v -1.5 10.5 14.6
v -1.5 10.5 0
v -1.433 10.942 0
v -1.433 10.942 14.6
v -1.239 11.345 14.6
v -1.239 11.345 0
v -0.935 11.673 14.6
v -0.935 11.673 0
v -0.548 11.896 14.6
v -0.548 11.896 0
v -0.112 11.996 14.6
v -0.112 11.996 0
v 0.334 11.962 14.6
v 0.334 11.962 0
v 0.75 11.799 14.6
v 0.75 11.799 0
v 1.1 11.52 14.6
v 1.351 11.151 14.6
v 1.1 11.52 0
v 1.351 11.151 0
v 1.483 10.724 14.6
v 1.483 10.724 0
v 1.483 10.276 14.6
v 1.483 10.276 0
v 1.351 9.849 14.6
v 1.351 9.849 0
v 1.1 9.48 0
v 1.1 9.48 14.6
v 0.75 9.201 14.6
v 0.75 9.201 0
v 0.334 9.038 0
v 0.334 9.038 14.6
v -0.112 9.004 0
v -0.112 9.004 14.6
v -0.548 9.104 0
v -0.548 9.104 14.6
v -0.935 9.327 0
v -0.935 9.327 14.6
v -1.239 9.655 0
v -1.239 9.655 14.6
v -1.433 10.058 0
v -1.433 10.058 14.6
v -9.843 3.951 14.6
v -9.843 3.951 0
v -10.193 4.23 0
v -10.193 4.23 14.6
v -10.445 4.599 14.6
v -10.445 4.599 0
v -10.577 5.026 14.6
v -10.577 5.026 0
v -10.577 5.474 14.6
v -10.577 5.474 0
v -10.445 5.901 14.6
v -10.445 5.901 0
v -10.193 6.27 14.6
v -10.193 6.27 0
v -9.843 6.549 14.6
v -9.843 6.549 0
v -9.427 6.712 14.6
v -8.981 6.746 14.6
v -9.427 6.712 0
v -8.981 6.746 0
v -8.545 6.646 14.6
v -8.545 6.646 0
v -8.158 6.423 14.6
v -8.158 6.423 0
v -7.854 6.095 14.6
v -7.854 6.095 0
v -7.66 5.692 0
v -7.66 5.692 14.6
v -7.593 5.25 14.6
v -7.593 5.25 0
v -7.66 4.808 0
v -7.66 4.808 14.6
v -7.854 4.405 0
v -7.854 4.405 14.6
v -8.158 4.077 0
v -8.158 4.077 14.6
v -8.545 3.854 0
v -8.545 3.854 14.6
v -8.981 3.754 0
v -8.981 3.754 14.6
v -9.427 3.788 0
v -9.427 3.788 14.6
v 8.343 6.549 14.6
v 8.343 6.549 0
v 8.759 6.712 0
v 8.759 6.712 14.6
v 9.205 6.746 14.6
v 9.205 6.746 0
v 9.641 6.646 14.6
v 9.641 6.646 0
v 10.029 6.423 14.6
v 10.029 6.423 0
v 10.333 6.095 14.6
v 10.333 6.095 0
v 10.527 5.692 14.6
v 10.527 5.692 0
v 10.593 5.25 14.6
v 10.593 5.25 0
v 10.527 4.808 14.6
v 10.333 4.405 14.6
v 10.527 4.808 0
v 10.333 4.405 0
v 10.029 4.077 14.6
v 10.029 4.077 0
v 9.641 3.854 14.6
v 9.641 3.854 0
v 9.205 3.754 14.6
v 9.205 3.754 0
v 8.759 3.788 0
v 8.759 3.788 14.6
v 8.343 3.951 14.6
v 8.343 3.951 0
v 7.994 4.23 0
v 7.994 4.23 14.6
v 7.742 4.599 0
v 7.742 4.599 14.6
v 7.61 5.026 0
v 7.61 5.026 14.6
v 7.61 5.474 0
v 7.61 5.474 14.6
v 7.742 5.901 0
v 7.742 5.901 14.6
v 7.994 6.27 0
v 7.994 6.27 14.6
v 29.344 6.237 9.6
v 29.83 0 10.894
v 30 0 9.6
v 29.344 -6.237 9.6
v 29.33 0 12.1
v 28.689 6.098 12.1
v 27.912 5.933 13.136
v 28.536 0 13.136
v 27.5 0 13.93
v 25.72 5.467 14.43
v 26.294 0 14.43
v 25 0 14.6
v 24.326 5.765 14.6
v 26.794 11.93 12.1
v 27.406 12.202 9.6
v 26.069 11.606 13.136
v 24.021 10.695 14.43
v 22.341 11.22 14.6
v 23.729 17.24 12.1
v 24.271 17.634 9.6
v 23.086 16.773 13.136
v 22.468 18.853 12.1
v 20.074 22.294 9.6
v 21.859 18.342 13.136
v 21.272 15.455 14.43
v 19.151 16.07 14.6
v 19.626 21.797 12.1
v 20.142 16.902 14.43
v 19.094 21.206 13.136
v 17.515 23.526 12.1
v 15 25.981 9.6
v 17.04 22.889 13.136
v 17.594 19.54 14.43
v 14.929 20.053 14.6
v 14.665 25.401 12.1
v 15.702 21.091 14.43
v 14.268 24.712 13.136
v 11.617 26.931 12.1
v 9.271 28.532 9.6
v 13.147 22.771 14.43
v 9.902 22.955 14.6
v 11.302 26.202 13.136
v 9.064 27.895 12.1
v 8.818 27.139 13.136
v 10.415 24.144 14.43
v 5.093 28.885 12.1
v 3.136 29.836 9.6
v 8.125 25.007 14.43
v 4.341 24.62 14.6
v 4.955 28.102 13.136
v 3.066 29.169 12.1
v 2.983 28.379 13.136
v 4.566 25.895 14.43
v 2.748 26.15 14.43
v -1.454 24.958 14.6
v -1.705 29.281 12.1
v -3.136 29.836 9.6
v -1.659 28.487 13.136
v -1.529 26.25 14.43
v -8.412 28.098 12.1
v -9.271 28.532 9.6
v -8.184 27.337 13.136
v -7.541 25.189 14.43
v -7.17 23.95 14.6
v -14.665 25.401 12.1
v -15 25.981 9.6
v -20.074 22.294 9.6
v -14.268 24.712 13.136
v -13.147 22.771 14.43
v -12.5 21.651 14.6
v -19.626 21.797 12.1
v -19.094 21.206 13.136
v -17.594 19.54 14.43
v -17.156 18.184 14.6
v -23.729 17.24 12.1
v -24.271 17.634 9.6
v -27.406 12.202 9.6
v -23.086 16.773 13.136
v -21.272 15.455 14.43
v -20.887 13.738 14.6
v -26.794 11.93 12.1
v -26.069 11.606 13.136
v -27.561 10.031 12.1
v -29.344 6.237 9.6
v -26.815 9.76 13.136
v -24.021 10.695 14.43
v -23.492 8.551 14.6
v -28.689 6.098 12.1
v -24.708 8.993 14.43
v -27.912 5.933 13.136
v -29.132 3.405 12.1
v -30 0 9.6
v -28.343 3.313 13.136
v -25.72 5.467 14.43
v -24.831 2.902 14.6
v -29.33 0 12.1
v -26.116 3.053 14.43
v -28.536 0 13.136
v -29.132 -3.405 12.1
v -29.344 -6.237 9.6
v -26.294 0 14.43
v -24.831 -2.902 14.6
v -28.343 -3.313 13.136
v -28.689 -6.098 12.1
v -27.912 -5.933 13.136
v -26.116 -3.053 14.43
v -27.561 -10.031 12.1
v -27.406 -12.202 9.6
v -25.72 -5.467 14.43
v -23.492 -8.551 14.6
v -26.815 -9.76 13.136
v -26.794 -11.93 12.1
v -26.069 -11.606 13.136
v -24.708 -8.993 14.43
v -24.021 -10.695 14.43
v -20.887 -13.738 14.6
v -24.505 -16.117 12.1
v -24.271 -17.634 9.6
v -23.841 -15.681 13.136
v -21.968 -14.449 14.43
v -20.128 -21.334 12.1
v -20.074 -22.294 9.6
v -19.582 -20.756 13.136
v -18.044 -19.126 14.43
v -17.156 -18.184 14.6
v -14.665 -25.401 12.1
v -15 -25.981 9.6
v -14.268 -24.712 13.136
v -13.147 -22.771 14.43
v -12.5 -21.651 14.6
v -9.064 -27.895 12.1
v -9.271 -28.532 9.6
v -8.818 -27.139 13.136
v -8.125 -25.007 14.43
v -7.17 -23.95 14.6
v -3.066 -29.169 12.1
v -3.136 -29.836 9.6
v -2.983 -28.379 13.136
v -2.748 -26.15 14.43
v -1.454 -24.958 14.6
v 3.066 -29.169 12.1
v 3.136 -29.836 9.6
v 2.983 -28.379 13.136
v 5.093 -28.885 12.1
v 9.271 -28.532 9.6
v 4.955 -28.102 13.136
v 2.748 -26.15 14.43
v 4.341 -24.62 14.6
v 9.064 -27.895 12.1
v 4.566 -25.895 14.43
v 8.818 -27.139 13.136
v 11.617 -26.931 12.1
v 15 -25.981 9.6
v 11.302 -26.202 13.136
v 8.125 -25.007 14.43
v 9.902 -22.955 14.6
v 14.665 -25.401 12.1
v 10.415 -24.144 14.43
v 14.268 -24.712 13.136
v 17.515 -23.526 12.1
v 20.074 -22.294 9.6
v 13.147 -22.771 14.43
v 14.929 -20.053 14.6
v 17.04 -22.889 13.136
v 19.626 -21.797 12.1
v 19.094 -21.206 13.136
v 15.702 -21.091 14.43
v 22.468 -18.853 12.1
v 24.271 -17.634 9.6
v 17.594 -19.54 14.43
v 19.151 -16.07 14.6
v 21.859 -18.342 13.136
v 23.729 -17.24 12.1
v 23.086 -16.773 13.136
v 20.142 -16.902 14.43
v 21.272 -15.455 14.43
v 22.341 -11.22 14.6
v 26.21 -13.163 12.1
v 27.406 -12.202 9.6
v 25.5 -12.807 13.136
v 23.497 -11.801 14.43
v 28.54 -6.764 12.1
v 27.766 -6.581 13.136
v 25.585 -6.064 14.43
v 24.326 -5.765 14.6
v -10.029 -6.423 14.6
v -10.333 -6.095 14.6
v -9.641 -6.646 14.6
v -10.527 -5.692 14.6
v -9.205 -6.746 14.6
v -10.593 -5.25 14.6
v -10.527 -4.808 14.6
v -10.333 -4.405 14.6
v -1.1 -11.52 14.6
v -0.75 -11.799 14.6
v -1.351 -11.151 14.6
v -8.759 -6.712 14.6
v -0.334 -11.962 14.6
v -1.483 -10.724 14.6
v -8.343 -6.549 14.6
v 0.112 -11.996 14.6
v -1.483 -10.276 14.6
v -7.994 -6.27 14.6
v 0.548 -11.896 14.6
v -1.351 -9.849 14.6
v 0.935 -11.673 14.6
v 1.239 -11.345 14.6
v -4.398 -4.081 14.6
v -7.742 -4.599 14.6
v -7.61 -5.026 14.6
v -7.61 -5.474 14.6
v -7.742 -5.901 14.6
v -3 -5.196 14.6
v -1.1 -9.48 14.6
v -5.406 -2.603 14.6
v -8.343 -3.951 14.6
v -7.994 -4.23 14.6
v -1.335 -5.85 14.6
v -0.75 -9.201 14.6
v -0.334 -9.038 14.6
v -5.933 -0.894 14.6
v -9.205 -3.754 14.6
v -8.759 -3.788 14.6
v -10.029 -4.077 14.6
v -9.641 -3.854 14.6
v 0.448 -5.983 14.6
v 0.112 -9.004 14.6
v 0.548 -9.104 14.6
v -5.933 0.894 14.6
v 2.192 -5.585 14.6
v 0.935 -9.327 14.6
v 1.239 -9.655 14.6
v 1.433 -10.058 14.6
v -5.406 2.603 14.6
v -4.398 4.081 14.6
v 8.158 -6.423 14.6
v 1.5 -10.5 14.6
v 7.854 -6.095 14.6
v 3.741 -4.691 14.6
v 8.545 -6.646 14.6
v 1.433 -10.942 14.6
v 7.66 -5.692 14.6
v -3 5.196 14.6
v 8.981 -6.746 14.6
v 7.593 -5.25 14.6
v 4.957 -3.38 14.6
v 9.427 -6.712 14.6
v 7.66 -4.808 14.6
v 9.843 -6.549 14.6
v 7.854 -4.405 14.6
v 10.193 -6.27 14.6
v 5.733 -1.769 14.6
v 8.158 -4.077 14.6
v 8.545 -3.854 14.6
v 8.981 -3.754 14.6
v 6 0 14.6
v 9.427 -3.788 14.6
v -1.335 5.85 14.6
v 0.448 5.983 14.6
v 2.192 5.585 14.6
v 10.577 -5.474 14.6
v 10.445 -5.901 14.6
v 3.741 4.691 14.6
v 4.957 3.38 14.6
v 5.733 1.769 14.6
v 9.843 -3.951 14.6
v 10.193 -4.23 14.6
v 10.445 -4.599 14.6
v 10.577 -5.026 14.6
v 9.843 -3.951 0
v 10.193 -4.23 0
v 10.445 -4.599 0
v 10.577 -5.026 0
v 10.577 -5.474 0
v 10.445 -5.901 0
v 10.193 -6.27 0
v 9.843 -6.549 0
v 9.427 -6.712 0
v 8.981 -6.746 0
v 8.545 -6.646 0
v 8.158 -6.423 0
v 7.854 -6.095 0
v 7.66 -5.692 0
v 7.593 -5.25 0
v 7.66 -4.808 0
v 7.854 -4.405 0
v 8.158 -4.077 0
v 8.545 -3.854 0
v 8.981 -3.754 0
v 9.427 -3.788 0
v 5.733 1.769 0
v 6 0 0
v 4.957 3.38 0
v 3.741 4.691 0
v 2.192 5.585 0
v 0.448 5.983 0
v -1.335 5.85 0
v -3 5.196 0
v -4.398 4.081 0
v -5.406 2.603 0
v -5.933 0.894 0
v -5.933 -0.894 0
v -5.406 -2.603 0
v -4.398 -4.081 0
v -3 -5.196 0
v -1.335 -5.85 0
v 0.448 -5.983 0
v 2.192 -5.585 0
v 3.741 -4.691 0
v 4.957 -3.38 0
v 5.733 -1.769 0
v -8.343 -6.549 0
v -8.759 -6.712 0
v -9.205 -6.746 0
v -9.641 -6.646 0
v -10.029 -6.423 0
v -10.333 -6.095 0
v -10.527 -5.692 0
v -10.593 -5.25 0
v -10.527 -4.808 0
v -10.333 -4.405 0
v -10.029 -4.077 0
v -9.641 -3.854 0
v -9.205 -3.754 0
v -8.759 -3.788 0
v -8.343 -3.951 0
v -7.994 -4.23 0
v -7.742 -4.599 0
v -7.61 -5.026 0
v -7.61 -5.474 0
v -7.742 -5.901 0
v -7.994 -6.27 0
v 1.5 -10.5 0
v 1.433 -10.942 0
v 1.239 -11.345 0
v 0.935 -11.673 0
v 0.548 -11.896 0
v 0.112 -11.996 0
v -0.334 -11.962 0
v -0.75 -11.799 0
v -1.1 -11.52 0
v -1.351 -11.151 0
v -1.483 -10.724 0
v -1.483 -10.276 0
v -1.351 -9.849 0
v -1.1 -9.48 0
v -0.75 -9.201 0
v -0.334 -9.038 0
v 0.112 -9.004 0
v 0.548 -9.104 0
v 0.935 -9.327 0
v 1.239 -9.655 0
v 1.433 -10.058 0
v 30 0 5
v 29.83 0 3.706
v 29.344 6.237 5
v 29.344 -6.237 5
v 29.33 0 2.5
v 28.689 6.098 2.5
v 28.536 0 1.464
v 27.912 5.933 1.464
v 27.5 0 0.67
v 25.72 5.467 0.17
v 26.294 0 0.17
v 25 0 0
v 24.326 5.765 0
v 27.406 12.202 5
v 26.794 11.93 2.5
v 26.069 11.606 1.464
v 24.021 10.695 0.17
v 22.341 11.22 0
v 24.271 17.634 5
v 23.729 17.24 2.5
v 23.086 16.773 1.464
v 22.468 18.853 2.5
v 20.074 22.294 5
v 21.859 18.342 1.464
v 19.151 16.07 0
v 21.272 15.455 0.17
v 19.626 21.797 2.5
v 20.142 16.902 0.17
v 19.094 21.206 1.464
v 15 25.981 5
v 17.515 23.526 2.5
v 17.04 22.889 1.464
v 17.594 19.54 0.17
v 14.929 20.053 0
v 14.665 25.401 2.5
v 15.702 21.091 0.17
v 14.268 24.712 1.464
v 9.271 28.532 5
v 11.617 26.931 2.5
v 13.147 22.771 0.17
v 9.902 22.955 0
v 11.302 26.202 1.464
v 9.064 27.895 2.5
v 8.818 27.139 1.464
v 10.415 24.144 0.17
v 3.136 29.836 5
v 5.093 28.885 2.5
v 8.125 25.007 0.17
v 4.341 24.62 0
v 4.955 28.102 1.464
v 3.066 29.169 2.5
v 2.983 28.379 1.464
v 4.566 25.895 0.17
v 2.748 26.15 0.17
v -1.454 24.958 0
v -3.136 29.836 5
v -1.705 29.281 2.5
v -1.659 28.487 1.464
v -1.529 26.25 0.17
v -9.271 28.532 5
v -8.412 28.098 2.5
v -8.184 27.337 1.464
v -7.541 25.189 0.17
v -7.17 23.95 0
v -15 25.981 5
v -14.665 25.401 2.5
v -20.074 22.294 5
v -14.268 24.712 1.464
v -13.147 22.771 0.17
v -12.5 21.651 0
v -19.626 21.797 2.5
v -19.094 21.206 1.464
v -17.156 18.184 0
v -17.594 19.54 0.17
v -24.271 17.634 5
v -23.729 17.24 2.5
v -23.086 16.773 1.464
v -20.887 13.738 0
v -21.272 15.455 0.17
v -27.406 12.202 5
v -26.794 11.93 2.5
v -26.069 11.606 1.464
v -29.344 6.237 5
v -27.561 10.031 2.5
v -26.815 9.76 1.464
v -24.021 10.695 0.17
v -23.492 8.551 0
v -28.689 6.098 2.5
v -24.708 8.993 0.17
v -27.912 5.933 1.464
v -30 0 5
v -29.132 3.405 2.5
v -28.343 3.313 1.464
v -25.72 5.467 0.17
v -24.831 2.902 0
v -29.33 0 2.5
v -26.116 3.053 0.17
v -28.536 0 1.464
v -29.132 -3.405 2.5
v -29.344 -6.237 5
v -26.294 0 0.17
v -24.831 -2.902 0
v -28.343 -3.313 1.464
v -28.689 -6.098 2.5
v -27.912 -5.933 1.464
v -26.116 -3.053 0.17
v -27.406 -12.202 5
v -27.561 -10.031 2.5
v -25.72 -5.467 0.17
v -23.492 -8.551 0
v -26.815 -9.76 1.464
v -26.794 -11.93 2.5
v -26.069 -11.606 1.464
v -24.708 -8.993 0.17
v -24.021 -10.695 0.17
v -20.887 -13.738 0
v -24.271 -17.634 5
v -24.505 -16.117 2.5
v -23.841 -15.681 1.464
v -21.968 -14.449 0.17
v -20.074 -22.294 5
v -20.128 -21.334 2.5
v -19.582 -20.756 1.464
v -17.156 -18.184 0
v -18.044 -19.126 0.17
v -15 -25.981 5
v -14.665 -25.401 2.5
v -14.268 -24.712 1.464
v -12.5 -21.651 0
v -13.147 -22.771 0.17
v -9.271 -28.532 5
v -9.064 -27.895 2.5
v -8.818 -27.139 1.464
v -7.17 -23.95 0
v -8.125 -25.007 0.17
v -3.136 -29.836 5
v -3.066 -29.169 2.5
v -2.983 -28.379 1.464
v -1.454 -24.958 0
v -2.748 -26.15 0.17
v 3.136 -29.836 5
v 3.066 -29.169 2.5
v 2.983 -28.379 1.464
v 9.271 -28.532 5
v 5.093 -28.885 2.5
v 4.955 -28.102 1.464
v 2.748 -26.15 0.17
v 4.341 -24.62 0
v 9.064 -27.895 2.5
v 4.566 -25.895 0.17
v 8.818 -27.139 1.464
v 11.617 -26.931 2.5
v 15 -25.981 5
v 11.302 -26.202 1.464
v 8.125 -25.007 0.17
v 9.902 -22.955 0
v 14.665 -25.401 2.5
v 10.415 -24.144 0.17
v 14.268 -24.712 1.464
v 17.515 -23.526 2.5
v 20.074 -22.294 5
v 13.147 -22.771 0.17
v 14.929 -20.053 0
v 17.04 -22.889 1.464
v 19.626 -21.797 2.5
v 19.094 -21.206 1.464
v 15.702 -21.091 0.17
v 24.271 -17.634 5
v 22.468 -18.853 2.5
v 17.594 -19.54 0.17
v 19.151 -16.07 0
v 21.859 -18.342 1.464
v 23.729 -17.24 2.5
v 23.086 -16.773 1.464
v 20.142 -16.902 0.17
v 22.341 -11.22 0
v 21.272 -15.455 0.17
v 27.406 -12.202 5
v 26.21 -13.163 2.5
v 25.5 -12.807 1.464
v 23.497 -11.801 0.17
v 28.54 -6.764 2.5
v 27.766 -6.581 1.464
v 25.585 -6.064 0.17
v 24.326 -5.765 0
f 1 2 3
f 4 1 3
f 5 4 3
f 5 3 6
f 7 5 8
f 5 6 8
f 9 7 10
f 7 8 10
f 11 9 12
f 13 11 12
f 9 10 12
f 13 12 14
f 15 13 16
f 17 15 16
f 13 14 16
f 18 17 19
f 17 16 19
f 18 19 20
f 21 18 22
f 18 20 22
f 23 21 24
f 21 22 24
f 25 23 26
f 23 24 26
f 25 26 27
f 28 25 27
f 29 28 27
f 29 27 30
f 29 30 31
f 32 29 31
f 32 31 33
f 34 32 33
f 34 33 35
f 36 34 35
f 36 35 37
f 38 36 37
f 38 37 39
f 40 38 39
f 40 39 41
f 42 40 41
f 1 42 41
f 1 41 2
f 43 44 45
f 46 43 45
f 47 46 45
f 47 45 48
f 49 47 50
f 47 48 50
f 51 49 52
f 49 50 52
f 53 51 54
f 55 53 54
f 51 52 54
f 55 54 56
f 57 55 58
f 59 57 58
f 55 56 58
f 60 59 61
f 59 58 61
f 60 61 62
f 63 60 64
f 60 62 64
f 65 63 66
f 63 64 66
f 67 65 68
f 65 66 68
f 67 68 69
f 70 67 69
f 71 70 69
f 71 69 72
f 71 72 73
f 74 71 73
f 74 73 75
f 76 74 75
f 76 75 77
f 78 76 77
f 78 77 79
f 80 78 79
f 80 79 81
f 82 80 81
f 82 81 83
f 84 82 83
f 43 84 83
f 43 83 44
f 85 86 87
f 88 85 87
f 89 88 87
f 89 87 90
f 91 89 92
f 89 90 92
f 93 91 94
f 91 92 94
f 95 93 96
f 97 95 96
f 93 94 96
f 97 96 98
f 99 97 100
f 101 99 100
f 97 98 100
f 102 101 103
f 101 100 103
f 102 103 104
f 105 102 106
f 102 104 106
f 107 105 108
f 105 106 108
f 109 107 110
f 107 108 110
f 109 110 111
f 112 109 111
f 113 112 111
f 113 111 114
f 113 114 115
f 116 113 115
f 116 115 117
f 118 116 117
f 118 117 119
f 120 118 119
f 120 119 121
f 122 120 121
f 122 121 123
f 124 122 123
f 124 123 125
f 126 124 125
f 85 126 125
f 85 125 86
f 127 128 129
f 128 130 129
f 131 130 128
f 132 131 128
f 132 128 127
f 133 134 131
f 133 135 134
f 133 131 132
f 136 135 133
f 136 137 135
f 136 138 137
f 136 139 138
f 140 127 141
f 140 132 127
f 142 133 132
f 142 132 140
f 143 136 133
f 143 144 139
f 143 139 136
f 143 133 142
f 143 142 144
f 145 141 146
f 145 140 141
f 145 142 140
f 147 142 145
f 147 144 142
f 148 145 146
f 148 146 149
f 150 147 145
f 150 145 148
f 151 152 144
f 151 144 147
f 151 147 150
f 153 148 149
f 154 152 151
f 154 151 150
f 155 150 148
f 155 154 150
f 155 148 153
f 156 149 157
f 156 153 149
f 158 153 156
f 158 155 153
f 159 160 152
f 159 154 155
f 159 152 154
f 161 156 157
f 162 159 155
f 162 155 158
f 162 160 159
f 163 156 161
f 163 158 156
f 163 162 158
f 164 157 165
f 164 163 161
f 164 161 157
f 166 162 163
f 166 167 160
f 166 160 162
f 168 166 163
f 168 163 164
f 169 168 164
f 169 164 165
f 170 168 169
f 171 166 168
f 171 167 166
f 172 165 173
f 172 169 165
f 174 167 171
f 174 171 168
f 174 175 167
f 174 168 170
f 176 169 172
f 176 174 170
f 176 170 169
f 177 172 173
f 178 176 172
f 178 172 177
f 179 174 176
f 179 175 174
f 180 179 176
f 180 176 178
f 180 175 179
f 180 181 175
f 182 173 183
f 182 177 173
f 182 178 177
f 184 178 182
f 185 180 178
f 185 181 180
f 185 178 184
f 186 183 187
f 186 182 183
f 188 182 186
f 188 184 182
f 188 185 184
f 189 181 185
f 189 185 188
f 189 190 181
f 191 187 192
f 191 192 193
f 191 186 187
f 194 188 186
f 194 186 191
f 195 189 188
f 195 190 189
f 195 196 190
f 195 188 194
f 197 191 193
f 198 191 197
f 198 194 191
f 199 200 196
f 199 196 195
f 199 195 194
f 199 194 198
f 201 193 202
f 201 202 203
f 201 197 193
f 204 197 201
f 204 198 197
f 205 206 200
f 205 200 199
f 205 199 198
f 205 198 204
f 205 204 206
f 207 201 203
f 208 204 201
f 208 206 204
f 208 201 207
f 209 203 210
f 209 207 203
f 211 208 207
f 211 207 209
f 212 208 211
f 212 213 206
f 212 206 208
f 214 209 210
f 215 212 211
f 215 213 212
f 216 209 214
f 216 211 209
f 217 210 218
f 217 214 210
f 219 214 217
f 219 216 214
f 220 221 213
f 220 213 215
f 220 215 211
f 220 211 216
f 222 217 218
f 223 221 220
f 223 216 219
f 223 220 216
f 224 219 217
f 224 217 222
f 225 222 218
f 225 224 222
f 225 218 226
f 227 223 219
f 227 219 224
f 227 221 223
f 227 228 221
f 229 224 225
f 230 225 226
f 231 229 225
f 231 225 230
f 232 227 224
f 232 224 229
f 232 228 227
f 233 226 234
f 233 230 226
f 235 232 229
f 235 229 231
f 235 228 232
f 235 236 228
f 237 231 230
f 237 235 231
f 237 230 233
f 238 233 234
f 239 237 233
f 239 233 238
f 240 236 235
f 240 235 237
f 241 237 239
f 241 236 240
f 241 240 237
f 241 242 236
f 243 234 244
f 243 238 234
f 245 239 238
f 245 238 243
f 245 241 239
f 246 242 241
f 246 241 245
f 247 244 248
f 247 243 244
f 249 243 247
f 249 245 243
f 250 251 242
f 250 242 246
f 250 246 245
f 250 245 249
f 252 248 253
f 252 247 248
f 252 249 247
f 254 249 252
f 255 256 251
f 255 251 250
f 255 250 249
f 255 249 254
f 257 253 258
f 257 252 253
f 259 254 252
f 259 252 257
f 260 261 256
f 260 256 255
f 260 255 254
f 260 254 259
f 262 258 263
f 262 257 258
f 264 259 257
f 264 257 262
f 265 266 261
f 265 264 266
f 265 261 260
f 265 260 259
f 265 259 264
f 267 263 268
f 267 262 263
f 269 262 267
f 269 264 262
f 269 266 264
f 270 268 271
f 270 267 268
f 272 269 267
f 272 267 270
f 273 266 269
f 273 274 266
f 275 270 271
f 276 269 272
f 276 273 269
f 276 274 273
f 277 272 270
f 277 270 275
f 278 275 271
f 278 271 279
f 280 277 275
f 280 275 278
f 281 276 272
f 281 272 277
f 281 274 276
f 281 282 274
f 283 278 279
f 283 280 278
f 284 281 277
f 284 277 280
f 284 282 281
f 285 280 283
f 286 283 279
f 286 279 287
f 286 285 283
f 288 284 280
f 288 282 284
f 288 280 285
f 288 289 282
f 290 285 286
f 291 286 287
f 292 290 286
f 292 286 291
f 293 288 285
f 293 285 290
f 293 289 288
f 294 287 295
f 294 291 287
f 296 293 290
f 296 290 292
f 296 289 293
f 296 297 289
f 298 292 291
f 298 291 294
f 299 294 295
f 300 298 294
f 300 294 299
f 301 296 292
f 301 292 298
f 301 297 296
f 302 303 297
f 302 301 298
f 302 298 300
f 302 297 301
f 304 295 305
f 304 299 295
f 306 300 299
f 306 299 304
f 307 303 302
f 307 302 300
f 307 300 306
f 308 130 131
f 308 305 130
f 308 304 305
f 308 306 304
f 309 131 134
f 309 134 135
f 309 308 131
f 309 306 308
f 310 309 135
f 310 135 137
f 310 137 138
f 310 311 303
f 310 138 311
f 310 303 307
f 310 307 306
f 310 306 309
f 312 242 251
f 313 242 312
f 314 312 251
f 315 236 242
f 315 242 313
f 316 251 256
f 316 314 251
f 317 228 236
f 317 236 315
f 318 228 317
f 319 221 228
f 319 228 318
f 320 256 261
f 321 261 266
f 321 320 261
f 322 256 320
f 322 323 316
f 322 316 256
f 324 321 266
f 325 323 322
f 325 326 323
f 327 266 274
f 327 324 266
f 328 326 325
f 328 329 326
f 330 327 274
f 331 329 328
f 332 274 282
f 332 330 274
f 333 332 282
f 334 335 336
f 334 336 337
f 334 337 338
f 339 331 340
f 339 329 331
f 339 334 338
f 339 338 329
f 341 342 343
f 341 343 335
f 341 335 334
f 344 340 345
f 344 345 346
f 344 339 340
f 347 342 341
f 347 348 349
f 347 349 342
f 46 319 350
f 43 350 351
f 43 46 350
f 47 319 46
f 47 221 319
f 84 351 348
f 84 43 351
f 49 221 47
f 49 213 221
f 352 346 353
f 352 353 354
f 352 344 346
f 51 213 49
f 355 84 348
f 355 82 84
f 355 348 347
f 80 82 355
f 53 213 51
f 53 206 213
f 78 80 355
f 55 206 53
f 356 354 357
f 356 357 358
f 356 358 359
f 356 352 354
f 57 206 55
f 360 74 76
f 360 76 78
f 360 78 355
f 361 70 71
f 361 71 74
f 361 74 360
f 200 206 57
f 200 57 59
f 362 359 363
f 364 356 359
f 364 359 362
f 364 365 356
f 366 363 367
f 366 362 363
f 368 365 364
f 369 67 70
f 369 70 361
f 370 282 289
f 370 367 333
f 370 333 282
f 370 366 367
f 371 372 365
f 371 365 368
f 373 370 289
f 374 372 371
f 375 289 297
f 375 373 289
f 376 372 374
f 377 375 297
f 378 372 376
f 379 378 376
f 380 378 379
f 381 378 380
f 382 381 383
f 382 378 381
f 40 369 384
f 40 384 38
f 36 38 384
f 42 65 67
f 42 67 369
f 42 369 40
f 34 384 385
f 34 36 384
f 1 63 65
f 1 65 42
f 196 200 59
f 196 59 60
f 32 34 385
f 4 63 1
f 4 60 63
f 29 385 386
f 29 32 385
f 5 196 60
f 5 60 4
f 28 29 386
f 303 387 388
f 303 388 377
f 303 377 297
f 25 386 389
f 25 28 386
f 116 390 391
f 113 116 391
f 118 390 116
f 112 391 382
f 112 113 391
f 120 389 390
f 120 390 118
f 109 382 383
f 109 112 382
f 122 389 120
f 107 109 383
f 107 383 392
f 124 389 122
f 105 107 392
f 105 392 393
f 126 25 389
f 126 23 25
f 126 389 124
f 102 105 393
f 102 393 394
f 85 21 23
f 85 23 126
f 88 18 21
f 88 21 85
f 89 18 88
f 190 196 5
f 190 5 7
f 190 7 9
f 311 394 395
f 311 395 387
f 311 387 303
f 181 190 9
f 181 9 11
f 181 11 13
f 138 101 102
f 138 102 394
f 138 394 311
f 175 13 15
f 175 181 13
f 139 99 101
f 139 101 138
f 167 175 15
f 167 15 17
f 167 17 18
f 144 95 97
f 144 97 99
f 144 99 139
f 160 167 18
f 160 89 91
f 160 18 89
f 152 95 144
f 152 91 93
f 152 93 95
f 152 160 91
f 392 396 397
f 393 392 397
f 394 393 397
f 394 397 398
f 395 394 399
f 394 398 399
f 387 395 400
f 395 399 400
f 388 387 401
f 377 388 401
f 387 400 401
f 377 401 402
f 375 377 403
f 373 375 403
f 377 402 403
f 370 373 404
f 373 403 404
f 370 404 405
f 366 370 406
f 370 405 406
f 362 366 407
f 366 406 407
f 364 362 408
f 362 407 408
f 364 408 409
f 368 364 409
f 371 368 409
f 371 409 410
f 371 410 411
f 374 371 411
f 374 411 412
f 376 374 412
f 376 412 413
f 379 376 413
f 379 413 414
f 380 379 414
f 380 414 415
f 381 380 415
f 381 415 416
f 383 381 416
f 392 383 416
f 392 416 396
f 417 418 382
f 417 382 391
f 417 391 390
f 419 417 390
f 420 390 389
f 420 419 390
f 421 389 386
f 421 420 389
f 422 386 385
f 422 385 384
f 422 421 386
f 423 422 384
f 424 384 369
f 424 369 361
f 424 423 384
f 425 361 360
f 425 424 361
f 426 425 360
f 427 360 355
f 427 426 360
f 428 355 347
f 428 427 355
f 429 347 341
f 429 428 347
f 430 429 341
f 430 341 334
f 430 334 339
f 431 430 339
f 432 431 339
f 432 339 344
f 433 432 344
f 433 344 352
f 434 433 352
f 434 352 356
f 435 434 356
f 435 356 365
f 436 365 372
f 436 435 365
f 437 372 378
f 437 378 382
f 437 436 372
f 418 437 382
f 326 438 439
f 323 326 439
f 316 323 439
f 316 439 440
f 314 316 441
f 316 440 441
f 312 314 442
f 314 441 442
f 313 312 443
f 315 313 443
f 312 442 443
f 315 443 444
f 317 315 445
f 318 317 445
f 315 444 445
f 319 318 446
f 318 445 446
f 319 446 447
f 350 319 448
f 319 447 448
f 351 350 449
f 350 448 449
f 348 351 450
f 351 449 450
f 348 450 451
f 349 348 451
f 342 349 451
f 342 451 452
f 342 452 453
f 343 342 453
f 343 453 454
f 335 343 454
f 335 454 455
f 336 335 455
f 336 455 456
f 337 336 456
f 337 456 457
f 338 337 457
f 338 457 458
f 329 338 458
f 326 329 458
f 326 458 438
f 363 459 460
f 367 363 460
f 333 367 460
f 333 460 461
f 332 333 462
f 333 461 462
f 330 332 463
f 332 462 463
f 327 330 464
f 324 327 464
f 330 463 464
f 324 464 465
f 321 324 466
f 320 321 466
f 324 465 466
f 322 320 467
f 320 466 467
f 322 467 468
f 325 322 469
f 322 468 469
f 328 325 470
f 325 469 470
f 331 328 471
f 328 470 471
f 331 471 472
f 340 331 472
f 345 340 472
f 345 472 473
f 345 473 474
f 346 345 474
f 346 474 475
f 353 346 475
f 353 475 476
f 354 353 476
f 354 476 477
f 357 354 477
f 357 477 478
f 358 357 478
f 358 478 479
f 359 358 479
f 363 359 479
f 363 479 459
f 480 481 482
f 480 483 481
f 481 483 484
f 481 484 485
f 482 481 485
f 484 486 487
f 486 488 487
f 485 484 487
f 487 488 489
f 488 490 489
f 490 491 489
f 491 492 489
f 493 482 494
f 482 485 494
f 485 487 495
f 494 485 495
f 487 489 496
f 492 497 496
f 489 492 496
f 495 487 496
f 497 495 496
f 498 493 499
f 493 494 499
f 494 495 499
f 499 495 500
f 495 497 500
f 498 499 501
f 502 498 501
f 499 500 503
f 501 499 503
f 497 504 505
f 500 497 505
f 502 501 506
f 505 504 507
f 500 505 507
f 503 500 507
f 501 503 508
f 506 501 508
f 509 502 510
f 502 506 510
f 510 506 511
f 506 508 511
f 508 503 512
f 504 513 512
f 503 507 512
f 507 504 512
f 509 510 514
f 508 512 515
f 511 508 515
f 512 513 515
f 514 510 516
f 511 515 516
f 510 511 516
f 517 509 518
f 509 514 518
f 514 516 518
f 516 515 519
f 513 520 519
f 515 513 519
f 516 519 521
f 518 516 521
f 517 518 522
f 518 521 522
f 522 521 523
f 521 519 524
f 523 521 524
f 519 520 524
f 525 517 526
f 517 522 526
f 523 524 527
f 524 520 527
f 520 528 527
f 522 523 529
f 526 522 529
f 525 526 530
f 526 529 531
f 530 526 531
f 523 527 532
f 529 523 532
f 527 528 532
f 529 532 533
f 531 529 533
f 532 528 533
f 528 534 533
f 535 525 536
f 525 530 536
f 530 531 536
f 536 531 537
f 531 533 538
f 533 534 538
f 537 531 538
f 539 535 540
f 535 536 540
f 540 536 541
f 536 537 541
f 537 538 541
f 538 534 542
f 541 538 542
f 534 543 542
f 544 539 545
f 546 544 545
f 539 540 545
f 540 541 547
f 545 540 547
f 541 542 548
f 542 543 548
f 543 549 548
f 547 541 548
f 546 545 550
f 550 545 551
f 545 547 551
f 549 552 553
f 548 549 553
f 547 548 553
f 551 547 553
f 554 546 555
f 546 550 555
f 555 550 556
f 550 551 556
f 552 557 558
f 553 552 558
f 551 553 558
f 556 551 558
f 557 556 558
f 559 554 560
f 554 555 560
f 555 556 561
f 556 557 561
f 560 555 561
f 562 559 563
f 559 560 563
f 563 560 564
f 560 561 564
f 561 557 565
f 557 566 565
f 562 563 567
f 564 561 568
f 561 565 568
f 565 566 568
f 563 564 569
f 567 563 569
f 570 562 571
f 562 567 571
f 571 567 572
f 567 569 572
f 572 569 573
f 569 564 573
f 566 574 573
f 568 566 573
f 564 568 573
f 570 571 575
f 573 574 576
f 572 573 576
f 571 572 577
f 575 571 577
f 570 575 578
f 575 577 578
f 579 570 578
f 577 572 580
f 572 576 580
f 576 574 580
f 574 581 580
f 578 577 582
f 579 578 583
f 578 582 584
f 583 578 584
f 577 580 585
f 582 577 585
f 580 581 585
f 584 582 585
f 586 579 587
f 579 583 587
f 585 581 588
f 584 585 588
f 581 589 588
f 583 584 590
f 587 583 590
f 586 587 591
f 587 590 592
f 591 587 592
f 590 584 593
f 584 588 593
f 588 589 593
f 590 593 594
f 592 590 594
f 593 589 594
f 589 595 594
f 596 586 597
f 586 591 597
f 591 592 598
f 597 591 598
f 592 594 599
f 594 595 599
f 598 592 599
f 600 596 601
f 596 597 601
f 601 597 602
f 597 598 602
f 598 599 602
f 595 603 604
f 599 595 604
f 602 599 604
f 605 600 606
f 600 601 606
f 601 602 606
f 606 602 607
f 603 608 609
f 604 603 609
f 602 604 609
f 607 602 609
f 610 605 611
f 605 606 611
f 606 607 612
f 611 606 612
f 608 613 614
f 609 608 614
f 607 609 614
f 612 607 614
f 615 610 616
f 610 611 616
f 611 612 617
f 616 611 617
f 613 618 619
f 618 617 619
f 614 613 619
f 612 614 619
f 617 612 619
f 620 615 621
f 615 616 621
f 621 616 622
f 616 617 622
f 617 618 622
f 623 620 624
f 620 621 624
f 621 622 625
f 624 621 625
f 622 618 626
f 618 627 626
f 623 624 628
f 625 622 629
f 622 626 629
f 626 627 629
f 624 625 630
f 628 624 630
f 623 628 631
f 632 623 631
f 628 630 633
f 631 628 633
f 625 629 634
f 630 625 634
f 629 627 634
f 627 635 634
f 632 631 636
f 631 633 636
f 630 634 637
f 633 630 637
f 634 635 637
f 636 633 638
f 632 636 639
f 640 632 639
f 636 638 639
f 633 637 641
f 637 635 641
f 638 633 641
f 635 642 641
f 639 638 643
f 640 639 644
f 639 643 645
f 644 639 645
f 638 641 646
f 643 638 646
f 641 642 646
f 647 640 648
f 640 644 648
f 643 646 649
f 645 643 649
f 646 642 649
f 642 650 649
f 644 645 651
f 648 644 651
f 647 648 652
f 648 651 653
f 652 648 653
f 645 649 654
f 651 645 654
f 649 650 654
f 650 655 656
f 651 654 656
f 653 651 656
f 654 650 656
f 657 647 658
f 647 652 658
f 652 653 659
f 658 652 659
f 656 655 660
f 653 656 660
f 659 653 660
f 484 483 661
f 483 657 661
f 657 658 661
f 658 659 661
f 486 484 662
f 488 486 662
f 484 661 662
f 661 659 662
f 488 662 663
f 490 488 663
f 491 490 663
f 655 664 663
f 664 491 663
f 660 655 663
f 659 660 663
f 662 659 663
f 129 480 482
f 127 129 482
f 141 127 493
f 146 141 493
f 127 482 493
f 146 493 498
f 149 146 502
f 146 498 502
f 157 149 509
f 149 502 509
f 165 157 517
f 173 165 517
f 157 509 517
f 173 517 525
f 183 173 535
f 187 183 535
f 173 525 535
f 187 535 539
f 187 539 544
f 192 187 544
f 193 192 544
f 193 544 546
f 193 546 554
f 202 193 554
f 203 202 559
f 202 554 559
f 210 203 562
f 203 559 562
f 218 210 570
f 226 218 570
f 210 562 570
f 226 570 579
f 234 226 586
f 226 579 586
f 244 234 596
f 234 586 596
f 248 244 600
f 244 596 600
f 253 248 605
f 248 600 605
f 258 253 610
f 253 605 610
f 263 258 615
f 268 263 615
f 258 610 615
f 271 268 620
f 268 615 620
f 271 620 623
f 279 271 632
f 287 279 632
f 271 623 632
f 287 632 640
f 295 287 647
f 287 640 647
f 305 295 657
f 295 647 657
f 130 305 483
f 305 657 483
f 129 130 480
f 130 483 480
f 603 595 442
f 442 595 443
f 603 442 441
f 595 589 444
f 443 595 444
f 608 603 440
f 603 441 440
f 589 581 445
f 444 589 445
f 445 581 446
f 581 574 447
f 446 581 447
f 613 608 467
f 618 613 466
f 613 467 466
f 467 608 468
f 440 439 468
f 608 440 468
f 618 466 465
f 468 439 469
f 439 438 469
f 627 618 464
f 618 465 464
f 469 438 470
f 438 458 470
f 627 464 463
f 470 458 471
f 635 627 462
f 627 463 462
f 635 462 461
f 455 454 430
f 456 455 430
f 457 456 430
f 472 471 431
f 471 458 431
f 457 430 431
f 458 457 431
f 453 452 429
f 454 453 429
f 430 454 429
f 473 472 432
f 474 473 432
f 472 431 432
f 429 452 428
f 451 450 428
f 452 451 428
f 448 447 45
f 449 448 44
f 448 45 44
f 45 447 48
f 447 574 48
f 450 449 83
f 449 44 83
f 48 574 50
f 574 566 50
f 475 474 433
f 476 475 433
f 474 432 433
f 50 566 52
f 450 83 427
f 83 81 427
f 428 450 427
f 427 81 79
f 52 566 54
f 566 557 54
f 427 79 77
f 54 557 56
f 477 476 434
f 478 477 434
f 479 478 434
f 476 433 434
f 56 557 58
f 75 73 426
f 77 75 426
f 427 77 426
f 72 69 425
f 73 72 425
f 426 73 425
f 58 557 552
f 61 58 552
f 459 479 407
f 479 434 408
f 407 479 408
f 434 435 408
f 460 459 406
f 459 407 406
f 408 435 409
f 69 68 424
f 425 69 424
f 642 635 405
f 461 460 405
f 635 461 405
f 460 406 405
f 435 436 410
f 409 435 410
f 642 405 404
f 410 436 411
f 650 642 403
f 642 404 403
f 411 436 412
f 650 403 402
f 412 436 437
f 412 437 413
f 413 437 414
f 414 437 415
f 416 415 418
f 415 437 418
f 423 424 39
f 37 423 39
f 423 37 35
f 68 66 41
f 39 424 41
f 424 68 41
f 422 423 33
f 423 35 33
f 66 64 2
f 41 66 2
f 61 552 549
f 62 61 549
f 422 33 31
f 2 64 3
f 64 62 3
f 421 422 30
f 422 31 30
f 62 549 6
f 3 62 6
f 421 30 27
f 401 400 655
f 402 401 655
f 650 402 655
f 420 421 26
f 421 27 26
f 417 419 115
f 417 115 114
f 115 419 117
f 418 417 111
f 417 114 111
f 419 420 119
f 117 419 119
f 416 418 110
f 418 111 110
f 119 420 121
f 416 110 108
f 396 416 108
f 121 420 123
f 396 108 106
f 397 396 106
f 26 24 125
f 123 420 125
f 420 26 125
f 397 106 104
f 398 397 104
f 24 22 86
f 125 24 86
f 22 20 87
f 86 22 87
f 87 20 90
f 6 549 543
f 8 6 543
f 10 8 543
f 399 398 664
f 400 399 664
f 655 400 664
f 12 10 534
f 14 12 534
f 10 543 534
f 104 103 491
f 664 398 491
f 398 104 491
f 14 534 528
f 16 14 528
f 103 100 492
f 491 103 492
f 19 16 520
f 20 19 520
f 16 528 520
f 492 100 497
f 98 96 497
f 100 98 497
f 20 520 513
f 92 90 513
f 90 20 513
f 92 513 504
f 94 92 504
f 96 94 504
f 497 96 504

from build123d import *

# Parameters (mm, degrees)
SKETCH_1_R               = 30
SKETCH_1_R_2             = 6
EXTRUDE_1_DEPTH          = 14.6
FILLET_2_R               = 5
SKETCH_3_R               = 1.5
CUT_EXTRUDE_1_DEPTH      = 15.6
PATTERN_CIRCULAR_2_COUNT = 6


with BuildPart() as part:
    # ｽｹｯﾁ1 → ﾎﾞｽ - 押し出し1 (new body)
    with BuildSketch(Plane.XY):
        Circle(SKETCH_1_R)
        Circle(SKETCH_1_R_2, mode=Mode.SUBTRACT)
    extrude(amount=EXTRUDE_1_DEPTH)

    # ﾌｨﾚｯﾄ2
    fillet_2_edges = [part.edges().sort_by_distance(p)[0] for p in [
        (-30, 0, 0),
        (-30, 0, 14.6),
    ]]
    fillet(fillet_2_edges, radius=FILLET_2_R)

    # ｽｹｯﾁ3 → ｶｯﾄ - 押し出し1 (cut, through all)
    with BuildSketch(Plane(origin=(0, 0, 0), x_dir=(-1, 0, 0), z_dir=(0, 0, -1))):
        with Locations((0, 10.5)):
            Circle(SKETCH_3_R)
    cut_extrude_1 = extrude(amount=-CUT_EXTRUDE_1_DEPTH, mode=Mode.SUBTRACT)

    # 円形ﾊﾟﾀｰﾝ2: ｶｯﾄ - 押し出し1 ×6 about axis
    pattern_circular_2_axis = Axis((0, 0, 0), (0, 0, 1))
    for i in range(1, PATTERN_CIRCULAR_2_COUNT):
        add(cut_extrude_1.rotate(pattern_circular_2_axis, i * 360 / PATTERN_CIRCULAR_2_COUNT), mode=Mode.SUBTRACT)


solid = part.part
